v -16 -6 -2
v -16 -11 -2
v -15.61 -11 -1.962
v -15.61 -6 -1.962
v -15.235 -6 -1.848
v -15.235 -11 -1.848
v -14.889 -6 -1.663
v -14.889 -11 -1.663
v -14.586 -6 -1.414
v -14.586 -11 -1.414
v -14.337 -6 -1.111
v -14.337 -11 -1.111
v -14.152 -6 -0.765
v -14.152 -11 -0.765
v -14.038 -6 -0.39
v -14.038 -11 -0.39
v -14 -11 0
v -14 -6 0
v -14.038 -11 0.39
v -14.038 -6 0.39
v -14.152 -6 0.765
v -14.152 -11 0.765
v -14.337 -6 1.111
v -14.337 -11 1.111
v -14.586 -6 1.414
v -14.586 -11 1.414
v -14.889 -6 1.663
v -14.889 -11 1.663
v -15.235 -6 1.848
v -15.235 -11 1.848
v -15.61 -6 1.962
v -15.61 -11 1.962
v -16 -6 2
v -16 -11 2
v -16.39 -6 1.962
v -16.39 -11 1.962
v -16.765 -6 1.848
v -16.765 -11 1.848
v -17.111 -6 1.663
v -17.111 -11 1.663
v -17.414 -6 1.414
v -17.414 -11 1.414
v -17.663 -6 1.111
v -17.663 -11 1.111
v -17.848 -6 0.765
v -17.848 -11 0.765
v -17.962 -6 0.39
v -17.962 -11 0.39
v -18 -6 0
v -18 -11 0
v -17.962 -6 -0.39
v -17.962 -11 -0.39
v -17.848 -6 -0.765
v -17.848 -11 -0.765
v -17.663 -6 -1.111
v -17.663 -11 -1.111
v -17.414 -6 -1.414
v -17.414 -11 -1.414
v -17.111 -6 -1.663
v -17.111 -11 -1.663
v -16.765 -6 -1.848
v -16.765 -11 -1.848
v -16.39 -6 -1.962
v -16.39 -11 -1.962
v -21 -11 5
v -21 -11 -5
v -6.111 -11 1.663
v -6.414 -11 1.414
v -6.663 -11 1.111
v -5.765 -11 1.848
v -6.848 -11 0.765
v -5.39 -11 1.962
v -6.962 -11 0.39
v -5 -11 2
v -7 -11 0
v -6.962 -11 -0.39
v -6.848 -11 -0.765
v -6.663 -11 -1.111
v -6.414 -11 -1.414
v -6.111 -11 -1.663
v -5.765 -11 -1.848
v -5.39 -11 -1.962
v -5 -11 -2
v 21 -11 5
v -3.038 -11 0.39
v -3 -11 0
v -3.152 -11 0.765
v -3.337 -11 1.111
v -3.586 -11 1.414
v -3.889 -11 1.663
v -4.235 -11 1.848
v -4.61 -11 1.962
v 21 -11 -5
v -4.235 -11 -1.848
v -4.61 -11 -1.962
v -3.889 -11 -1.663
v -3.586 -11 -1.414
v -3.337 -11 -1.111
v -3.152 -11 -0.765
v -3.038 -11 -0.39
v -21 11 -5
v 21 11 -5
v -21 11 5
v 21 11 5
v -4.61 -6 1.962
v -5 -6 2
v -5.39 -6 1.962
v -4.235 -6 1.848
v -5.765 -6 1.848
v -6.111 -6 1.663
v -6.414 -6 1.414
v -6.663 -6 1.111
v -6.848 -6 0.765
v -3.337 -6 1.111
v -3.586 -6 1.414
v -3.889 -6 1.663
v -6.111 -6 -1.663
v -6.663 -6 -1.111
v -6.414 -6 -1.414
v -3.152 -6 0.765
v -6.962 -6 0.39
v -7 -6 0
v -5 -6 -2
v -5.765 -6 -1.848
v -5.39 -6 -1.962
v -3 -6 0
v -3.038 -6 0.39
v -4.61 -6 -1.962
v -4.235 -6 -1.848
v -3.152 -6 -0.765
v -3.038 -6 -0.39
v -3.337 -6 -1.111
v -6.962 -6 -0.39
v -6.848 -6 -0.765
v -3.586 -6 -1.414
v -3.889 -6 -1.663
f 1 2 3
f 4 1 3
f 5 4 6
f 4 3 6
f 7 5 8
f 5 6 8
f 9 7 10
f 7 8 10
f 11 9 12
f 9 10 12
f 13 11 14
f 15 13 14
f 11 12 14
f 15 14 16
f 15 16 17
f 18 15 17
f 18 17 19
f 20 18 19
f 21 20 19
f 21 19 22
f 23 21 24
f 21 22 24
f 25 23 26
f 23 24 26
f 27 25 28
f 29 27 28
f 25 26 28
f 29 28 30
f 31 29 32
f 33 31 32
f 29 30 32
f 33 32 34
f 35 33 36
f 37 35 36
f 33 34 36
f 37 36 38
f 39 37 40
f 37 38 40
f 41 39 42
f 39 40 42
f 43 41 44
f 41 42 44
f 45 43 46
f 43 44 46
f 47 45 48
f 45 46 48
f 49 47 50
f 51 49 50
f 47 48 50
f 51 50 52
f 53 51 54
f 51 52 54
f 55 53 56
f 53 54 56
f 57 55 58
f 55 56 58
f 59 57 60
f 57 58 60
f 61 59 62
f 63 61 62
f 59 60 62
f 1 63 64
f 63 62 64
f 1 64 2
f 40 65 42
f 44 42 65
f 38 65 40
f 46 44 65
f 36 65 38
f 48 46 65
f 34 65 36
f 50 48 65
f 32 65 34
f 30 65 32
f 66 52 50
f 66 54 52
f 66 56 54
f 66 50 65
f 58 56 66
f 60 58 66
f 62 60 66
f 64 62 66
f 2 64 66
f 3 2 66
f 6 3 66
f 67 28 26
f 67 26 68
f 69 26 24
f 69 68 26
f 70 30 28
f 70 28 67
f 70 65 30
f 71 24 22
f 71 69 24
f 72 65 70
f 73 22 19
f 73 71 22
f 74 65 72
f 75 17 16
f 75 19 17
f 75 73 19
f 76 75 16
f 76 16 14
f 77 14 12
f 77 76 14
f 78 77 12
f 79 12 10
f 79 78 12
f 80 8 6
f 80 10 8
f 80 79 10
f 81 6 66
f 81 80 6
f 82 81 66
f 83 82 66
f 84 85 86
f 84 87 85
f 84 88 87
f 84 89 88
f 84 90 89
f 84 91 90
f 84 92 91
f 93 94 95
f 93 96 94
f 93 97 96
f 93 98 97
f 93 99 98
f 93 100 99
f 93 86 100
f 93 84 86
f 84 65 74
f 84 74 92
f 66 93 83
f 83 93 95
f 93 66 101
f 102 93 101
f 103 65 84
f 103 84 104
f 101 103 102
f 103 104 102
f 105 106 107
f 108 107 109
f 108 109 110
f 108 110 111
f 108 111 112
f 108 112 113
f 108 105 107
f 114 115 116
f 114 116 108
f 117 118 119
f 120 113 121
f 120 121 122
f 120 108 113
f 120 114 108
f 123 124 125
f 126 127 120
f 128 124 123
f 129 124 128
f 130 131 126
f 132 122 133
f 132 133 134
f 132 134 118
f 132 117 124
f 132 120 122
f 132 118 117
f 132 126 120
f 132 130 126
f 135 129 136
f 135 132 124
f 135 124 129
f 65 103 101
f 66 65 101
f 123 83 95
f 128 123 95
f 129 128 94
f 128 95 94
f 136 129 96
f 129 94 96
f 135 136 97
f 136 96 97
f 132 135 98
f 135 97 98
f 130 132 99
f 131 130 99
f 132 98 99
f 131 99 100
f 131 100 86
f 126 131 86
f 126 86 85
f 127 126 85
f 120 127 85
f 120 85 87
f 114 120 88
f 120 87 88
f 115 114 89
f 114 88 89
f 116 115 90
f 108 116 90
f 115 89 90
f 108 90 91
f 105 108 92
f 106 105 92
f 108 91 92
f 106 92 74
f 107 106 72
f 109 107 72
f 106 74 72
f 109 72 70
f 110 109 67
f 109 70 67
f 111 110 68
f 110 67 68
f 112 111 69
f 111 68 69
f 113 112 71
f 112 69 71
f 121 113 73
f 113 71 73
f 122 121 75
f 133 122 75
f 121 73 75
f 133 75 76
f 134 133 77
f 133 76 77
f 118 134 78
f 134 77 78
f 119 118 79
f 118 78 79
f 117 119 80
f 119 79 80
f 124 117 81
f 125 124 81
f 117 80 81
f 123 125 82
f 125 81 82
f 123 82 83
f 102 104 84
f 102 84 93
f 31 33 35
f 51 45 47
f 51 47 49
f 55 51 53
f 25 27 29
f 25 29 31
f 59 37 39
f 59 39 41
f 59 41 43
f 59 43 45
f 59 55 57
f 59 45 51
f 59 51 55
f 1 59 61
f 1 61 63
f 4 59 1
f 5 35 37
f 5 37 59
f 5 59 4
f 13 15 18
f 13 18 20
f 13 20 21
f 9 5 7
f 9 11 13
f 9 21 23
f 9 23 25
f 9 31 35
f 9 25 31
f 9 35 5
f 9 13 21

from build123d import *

# Parameters (mm, degrees)
SKETCH2_W           = 10
SKETCH2_H           = 22
BOSS_EXTRUDE1_DEPTH = 21
SKETCH3_R           = 2
CUT_EXTRUDE1_DEPTH  = 5


with BuildPart() as part:
    # Sketch2 → Boss-Extrude1 (new, symmetric)
    with BuildSketch(Plane(origin=(0, 0, 0), x_dir=(0, 0, -1), z_dir=(1, 0, 0))):
        Rectangle(SKETCH2_W, SKETCH2_H)
    extrude(amount=BOSS_EXTRUDE1_DEPTH, both=True)

    # Sketch3 → Cut-Extrude1 (cut)
    with BuildSketch(Plane.XZ.offset(11)):
        with Locations(Location((-16, 0, 0), (0, 0, 270))):
            Circle(SKETCH3_R)
        with Locations(Location((-5, 0, 0), (0, 0, 270))):
            Circle(SKETCH3_R)
    extrude(amount=-CUT_EXTRUDE1_DEPTH, mode=Mode.SUBTRACT)


solid = part.part
